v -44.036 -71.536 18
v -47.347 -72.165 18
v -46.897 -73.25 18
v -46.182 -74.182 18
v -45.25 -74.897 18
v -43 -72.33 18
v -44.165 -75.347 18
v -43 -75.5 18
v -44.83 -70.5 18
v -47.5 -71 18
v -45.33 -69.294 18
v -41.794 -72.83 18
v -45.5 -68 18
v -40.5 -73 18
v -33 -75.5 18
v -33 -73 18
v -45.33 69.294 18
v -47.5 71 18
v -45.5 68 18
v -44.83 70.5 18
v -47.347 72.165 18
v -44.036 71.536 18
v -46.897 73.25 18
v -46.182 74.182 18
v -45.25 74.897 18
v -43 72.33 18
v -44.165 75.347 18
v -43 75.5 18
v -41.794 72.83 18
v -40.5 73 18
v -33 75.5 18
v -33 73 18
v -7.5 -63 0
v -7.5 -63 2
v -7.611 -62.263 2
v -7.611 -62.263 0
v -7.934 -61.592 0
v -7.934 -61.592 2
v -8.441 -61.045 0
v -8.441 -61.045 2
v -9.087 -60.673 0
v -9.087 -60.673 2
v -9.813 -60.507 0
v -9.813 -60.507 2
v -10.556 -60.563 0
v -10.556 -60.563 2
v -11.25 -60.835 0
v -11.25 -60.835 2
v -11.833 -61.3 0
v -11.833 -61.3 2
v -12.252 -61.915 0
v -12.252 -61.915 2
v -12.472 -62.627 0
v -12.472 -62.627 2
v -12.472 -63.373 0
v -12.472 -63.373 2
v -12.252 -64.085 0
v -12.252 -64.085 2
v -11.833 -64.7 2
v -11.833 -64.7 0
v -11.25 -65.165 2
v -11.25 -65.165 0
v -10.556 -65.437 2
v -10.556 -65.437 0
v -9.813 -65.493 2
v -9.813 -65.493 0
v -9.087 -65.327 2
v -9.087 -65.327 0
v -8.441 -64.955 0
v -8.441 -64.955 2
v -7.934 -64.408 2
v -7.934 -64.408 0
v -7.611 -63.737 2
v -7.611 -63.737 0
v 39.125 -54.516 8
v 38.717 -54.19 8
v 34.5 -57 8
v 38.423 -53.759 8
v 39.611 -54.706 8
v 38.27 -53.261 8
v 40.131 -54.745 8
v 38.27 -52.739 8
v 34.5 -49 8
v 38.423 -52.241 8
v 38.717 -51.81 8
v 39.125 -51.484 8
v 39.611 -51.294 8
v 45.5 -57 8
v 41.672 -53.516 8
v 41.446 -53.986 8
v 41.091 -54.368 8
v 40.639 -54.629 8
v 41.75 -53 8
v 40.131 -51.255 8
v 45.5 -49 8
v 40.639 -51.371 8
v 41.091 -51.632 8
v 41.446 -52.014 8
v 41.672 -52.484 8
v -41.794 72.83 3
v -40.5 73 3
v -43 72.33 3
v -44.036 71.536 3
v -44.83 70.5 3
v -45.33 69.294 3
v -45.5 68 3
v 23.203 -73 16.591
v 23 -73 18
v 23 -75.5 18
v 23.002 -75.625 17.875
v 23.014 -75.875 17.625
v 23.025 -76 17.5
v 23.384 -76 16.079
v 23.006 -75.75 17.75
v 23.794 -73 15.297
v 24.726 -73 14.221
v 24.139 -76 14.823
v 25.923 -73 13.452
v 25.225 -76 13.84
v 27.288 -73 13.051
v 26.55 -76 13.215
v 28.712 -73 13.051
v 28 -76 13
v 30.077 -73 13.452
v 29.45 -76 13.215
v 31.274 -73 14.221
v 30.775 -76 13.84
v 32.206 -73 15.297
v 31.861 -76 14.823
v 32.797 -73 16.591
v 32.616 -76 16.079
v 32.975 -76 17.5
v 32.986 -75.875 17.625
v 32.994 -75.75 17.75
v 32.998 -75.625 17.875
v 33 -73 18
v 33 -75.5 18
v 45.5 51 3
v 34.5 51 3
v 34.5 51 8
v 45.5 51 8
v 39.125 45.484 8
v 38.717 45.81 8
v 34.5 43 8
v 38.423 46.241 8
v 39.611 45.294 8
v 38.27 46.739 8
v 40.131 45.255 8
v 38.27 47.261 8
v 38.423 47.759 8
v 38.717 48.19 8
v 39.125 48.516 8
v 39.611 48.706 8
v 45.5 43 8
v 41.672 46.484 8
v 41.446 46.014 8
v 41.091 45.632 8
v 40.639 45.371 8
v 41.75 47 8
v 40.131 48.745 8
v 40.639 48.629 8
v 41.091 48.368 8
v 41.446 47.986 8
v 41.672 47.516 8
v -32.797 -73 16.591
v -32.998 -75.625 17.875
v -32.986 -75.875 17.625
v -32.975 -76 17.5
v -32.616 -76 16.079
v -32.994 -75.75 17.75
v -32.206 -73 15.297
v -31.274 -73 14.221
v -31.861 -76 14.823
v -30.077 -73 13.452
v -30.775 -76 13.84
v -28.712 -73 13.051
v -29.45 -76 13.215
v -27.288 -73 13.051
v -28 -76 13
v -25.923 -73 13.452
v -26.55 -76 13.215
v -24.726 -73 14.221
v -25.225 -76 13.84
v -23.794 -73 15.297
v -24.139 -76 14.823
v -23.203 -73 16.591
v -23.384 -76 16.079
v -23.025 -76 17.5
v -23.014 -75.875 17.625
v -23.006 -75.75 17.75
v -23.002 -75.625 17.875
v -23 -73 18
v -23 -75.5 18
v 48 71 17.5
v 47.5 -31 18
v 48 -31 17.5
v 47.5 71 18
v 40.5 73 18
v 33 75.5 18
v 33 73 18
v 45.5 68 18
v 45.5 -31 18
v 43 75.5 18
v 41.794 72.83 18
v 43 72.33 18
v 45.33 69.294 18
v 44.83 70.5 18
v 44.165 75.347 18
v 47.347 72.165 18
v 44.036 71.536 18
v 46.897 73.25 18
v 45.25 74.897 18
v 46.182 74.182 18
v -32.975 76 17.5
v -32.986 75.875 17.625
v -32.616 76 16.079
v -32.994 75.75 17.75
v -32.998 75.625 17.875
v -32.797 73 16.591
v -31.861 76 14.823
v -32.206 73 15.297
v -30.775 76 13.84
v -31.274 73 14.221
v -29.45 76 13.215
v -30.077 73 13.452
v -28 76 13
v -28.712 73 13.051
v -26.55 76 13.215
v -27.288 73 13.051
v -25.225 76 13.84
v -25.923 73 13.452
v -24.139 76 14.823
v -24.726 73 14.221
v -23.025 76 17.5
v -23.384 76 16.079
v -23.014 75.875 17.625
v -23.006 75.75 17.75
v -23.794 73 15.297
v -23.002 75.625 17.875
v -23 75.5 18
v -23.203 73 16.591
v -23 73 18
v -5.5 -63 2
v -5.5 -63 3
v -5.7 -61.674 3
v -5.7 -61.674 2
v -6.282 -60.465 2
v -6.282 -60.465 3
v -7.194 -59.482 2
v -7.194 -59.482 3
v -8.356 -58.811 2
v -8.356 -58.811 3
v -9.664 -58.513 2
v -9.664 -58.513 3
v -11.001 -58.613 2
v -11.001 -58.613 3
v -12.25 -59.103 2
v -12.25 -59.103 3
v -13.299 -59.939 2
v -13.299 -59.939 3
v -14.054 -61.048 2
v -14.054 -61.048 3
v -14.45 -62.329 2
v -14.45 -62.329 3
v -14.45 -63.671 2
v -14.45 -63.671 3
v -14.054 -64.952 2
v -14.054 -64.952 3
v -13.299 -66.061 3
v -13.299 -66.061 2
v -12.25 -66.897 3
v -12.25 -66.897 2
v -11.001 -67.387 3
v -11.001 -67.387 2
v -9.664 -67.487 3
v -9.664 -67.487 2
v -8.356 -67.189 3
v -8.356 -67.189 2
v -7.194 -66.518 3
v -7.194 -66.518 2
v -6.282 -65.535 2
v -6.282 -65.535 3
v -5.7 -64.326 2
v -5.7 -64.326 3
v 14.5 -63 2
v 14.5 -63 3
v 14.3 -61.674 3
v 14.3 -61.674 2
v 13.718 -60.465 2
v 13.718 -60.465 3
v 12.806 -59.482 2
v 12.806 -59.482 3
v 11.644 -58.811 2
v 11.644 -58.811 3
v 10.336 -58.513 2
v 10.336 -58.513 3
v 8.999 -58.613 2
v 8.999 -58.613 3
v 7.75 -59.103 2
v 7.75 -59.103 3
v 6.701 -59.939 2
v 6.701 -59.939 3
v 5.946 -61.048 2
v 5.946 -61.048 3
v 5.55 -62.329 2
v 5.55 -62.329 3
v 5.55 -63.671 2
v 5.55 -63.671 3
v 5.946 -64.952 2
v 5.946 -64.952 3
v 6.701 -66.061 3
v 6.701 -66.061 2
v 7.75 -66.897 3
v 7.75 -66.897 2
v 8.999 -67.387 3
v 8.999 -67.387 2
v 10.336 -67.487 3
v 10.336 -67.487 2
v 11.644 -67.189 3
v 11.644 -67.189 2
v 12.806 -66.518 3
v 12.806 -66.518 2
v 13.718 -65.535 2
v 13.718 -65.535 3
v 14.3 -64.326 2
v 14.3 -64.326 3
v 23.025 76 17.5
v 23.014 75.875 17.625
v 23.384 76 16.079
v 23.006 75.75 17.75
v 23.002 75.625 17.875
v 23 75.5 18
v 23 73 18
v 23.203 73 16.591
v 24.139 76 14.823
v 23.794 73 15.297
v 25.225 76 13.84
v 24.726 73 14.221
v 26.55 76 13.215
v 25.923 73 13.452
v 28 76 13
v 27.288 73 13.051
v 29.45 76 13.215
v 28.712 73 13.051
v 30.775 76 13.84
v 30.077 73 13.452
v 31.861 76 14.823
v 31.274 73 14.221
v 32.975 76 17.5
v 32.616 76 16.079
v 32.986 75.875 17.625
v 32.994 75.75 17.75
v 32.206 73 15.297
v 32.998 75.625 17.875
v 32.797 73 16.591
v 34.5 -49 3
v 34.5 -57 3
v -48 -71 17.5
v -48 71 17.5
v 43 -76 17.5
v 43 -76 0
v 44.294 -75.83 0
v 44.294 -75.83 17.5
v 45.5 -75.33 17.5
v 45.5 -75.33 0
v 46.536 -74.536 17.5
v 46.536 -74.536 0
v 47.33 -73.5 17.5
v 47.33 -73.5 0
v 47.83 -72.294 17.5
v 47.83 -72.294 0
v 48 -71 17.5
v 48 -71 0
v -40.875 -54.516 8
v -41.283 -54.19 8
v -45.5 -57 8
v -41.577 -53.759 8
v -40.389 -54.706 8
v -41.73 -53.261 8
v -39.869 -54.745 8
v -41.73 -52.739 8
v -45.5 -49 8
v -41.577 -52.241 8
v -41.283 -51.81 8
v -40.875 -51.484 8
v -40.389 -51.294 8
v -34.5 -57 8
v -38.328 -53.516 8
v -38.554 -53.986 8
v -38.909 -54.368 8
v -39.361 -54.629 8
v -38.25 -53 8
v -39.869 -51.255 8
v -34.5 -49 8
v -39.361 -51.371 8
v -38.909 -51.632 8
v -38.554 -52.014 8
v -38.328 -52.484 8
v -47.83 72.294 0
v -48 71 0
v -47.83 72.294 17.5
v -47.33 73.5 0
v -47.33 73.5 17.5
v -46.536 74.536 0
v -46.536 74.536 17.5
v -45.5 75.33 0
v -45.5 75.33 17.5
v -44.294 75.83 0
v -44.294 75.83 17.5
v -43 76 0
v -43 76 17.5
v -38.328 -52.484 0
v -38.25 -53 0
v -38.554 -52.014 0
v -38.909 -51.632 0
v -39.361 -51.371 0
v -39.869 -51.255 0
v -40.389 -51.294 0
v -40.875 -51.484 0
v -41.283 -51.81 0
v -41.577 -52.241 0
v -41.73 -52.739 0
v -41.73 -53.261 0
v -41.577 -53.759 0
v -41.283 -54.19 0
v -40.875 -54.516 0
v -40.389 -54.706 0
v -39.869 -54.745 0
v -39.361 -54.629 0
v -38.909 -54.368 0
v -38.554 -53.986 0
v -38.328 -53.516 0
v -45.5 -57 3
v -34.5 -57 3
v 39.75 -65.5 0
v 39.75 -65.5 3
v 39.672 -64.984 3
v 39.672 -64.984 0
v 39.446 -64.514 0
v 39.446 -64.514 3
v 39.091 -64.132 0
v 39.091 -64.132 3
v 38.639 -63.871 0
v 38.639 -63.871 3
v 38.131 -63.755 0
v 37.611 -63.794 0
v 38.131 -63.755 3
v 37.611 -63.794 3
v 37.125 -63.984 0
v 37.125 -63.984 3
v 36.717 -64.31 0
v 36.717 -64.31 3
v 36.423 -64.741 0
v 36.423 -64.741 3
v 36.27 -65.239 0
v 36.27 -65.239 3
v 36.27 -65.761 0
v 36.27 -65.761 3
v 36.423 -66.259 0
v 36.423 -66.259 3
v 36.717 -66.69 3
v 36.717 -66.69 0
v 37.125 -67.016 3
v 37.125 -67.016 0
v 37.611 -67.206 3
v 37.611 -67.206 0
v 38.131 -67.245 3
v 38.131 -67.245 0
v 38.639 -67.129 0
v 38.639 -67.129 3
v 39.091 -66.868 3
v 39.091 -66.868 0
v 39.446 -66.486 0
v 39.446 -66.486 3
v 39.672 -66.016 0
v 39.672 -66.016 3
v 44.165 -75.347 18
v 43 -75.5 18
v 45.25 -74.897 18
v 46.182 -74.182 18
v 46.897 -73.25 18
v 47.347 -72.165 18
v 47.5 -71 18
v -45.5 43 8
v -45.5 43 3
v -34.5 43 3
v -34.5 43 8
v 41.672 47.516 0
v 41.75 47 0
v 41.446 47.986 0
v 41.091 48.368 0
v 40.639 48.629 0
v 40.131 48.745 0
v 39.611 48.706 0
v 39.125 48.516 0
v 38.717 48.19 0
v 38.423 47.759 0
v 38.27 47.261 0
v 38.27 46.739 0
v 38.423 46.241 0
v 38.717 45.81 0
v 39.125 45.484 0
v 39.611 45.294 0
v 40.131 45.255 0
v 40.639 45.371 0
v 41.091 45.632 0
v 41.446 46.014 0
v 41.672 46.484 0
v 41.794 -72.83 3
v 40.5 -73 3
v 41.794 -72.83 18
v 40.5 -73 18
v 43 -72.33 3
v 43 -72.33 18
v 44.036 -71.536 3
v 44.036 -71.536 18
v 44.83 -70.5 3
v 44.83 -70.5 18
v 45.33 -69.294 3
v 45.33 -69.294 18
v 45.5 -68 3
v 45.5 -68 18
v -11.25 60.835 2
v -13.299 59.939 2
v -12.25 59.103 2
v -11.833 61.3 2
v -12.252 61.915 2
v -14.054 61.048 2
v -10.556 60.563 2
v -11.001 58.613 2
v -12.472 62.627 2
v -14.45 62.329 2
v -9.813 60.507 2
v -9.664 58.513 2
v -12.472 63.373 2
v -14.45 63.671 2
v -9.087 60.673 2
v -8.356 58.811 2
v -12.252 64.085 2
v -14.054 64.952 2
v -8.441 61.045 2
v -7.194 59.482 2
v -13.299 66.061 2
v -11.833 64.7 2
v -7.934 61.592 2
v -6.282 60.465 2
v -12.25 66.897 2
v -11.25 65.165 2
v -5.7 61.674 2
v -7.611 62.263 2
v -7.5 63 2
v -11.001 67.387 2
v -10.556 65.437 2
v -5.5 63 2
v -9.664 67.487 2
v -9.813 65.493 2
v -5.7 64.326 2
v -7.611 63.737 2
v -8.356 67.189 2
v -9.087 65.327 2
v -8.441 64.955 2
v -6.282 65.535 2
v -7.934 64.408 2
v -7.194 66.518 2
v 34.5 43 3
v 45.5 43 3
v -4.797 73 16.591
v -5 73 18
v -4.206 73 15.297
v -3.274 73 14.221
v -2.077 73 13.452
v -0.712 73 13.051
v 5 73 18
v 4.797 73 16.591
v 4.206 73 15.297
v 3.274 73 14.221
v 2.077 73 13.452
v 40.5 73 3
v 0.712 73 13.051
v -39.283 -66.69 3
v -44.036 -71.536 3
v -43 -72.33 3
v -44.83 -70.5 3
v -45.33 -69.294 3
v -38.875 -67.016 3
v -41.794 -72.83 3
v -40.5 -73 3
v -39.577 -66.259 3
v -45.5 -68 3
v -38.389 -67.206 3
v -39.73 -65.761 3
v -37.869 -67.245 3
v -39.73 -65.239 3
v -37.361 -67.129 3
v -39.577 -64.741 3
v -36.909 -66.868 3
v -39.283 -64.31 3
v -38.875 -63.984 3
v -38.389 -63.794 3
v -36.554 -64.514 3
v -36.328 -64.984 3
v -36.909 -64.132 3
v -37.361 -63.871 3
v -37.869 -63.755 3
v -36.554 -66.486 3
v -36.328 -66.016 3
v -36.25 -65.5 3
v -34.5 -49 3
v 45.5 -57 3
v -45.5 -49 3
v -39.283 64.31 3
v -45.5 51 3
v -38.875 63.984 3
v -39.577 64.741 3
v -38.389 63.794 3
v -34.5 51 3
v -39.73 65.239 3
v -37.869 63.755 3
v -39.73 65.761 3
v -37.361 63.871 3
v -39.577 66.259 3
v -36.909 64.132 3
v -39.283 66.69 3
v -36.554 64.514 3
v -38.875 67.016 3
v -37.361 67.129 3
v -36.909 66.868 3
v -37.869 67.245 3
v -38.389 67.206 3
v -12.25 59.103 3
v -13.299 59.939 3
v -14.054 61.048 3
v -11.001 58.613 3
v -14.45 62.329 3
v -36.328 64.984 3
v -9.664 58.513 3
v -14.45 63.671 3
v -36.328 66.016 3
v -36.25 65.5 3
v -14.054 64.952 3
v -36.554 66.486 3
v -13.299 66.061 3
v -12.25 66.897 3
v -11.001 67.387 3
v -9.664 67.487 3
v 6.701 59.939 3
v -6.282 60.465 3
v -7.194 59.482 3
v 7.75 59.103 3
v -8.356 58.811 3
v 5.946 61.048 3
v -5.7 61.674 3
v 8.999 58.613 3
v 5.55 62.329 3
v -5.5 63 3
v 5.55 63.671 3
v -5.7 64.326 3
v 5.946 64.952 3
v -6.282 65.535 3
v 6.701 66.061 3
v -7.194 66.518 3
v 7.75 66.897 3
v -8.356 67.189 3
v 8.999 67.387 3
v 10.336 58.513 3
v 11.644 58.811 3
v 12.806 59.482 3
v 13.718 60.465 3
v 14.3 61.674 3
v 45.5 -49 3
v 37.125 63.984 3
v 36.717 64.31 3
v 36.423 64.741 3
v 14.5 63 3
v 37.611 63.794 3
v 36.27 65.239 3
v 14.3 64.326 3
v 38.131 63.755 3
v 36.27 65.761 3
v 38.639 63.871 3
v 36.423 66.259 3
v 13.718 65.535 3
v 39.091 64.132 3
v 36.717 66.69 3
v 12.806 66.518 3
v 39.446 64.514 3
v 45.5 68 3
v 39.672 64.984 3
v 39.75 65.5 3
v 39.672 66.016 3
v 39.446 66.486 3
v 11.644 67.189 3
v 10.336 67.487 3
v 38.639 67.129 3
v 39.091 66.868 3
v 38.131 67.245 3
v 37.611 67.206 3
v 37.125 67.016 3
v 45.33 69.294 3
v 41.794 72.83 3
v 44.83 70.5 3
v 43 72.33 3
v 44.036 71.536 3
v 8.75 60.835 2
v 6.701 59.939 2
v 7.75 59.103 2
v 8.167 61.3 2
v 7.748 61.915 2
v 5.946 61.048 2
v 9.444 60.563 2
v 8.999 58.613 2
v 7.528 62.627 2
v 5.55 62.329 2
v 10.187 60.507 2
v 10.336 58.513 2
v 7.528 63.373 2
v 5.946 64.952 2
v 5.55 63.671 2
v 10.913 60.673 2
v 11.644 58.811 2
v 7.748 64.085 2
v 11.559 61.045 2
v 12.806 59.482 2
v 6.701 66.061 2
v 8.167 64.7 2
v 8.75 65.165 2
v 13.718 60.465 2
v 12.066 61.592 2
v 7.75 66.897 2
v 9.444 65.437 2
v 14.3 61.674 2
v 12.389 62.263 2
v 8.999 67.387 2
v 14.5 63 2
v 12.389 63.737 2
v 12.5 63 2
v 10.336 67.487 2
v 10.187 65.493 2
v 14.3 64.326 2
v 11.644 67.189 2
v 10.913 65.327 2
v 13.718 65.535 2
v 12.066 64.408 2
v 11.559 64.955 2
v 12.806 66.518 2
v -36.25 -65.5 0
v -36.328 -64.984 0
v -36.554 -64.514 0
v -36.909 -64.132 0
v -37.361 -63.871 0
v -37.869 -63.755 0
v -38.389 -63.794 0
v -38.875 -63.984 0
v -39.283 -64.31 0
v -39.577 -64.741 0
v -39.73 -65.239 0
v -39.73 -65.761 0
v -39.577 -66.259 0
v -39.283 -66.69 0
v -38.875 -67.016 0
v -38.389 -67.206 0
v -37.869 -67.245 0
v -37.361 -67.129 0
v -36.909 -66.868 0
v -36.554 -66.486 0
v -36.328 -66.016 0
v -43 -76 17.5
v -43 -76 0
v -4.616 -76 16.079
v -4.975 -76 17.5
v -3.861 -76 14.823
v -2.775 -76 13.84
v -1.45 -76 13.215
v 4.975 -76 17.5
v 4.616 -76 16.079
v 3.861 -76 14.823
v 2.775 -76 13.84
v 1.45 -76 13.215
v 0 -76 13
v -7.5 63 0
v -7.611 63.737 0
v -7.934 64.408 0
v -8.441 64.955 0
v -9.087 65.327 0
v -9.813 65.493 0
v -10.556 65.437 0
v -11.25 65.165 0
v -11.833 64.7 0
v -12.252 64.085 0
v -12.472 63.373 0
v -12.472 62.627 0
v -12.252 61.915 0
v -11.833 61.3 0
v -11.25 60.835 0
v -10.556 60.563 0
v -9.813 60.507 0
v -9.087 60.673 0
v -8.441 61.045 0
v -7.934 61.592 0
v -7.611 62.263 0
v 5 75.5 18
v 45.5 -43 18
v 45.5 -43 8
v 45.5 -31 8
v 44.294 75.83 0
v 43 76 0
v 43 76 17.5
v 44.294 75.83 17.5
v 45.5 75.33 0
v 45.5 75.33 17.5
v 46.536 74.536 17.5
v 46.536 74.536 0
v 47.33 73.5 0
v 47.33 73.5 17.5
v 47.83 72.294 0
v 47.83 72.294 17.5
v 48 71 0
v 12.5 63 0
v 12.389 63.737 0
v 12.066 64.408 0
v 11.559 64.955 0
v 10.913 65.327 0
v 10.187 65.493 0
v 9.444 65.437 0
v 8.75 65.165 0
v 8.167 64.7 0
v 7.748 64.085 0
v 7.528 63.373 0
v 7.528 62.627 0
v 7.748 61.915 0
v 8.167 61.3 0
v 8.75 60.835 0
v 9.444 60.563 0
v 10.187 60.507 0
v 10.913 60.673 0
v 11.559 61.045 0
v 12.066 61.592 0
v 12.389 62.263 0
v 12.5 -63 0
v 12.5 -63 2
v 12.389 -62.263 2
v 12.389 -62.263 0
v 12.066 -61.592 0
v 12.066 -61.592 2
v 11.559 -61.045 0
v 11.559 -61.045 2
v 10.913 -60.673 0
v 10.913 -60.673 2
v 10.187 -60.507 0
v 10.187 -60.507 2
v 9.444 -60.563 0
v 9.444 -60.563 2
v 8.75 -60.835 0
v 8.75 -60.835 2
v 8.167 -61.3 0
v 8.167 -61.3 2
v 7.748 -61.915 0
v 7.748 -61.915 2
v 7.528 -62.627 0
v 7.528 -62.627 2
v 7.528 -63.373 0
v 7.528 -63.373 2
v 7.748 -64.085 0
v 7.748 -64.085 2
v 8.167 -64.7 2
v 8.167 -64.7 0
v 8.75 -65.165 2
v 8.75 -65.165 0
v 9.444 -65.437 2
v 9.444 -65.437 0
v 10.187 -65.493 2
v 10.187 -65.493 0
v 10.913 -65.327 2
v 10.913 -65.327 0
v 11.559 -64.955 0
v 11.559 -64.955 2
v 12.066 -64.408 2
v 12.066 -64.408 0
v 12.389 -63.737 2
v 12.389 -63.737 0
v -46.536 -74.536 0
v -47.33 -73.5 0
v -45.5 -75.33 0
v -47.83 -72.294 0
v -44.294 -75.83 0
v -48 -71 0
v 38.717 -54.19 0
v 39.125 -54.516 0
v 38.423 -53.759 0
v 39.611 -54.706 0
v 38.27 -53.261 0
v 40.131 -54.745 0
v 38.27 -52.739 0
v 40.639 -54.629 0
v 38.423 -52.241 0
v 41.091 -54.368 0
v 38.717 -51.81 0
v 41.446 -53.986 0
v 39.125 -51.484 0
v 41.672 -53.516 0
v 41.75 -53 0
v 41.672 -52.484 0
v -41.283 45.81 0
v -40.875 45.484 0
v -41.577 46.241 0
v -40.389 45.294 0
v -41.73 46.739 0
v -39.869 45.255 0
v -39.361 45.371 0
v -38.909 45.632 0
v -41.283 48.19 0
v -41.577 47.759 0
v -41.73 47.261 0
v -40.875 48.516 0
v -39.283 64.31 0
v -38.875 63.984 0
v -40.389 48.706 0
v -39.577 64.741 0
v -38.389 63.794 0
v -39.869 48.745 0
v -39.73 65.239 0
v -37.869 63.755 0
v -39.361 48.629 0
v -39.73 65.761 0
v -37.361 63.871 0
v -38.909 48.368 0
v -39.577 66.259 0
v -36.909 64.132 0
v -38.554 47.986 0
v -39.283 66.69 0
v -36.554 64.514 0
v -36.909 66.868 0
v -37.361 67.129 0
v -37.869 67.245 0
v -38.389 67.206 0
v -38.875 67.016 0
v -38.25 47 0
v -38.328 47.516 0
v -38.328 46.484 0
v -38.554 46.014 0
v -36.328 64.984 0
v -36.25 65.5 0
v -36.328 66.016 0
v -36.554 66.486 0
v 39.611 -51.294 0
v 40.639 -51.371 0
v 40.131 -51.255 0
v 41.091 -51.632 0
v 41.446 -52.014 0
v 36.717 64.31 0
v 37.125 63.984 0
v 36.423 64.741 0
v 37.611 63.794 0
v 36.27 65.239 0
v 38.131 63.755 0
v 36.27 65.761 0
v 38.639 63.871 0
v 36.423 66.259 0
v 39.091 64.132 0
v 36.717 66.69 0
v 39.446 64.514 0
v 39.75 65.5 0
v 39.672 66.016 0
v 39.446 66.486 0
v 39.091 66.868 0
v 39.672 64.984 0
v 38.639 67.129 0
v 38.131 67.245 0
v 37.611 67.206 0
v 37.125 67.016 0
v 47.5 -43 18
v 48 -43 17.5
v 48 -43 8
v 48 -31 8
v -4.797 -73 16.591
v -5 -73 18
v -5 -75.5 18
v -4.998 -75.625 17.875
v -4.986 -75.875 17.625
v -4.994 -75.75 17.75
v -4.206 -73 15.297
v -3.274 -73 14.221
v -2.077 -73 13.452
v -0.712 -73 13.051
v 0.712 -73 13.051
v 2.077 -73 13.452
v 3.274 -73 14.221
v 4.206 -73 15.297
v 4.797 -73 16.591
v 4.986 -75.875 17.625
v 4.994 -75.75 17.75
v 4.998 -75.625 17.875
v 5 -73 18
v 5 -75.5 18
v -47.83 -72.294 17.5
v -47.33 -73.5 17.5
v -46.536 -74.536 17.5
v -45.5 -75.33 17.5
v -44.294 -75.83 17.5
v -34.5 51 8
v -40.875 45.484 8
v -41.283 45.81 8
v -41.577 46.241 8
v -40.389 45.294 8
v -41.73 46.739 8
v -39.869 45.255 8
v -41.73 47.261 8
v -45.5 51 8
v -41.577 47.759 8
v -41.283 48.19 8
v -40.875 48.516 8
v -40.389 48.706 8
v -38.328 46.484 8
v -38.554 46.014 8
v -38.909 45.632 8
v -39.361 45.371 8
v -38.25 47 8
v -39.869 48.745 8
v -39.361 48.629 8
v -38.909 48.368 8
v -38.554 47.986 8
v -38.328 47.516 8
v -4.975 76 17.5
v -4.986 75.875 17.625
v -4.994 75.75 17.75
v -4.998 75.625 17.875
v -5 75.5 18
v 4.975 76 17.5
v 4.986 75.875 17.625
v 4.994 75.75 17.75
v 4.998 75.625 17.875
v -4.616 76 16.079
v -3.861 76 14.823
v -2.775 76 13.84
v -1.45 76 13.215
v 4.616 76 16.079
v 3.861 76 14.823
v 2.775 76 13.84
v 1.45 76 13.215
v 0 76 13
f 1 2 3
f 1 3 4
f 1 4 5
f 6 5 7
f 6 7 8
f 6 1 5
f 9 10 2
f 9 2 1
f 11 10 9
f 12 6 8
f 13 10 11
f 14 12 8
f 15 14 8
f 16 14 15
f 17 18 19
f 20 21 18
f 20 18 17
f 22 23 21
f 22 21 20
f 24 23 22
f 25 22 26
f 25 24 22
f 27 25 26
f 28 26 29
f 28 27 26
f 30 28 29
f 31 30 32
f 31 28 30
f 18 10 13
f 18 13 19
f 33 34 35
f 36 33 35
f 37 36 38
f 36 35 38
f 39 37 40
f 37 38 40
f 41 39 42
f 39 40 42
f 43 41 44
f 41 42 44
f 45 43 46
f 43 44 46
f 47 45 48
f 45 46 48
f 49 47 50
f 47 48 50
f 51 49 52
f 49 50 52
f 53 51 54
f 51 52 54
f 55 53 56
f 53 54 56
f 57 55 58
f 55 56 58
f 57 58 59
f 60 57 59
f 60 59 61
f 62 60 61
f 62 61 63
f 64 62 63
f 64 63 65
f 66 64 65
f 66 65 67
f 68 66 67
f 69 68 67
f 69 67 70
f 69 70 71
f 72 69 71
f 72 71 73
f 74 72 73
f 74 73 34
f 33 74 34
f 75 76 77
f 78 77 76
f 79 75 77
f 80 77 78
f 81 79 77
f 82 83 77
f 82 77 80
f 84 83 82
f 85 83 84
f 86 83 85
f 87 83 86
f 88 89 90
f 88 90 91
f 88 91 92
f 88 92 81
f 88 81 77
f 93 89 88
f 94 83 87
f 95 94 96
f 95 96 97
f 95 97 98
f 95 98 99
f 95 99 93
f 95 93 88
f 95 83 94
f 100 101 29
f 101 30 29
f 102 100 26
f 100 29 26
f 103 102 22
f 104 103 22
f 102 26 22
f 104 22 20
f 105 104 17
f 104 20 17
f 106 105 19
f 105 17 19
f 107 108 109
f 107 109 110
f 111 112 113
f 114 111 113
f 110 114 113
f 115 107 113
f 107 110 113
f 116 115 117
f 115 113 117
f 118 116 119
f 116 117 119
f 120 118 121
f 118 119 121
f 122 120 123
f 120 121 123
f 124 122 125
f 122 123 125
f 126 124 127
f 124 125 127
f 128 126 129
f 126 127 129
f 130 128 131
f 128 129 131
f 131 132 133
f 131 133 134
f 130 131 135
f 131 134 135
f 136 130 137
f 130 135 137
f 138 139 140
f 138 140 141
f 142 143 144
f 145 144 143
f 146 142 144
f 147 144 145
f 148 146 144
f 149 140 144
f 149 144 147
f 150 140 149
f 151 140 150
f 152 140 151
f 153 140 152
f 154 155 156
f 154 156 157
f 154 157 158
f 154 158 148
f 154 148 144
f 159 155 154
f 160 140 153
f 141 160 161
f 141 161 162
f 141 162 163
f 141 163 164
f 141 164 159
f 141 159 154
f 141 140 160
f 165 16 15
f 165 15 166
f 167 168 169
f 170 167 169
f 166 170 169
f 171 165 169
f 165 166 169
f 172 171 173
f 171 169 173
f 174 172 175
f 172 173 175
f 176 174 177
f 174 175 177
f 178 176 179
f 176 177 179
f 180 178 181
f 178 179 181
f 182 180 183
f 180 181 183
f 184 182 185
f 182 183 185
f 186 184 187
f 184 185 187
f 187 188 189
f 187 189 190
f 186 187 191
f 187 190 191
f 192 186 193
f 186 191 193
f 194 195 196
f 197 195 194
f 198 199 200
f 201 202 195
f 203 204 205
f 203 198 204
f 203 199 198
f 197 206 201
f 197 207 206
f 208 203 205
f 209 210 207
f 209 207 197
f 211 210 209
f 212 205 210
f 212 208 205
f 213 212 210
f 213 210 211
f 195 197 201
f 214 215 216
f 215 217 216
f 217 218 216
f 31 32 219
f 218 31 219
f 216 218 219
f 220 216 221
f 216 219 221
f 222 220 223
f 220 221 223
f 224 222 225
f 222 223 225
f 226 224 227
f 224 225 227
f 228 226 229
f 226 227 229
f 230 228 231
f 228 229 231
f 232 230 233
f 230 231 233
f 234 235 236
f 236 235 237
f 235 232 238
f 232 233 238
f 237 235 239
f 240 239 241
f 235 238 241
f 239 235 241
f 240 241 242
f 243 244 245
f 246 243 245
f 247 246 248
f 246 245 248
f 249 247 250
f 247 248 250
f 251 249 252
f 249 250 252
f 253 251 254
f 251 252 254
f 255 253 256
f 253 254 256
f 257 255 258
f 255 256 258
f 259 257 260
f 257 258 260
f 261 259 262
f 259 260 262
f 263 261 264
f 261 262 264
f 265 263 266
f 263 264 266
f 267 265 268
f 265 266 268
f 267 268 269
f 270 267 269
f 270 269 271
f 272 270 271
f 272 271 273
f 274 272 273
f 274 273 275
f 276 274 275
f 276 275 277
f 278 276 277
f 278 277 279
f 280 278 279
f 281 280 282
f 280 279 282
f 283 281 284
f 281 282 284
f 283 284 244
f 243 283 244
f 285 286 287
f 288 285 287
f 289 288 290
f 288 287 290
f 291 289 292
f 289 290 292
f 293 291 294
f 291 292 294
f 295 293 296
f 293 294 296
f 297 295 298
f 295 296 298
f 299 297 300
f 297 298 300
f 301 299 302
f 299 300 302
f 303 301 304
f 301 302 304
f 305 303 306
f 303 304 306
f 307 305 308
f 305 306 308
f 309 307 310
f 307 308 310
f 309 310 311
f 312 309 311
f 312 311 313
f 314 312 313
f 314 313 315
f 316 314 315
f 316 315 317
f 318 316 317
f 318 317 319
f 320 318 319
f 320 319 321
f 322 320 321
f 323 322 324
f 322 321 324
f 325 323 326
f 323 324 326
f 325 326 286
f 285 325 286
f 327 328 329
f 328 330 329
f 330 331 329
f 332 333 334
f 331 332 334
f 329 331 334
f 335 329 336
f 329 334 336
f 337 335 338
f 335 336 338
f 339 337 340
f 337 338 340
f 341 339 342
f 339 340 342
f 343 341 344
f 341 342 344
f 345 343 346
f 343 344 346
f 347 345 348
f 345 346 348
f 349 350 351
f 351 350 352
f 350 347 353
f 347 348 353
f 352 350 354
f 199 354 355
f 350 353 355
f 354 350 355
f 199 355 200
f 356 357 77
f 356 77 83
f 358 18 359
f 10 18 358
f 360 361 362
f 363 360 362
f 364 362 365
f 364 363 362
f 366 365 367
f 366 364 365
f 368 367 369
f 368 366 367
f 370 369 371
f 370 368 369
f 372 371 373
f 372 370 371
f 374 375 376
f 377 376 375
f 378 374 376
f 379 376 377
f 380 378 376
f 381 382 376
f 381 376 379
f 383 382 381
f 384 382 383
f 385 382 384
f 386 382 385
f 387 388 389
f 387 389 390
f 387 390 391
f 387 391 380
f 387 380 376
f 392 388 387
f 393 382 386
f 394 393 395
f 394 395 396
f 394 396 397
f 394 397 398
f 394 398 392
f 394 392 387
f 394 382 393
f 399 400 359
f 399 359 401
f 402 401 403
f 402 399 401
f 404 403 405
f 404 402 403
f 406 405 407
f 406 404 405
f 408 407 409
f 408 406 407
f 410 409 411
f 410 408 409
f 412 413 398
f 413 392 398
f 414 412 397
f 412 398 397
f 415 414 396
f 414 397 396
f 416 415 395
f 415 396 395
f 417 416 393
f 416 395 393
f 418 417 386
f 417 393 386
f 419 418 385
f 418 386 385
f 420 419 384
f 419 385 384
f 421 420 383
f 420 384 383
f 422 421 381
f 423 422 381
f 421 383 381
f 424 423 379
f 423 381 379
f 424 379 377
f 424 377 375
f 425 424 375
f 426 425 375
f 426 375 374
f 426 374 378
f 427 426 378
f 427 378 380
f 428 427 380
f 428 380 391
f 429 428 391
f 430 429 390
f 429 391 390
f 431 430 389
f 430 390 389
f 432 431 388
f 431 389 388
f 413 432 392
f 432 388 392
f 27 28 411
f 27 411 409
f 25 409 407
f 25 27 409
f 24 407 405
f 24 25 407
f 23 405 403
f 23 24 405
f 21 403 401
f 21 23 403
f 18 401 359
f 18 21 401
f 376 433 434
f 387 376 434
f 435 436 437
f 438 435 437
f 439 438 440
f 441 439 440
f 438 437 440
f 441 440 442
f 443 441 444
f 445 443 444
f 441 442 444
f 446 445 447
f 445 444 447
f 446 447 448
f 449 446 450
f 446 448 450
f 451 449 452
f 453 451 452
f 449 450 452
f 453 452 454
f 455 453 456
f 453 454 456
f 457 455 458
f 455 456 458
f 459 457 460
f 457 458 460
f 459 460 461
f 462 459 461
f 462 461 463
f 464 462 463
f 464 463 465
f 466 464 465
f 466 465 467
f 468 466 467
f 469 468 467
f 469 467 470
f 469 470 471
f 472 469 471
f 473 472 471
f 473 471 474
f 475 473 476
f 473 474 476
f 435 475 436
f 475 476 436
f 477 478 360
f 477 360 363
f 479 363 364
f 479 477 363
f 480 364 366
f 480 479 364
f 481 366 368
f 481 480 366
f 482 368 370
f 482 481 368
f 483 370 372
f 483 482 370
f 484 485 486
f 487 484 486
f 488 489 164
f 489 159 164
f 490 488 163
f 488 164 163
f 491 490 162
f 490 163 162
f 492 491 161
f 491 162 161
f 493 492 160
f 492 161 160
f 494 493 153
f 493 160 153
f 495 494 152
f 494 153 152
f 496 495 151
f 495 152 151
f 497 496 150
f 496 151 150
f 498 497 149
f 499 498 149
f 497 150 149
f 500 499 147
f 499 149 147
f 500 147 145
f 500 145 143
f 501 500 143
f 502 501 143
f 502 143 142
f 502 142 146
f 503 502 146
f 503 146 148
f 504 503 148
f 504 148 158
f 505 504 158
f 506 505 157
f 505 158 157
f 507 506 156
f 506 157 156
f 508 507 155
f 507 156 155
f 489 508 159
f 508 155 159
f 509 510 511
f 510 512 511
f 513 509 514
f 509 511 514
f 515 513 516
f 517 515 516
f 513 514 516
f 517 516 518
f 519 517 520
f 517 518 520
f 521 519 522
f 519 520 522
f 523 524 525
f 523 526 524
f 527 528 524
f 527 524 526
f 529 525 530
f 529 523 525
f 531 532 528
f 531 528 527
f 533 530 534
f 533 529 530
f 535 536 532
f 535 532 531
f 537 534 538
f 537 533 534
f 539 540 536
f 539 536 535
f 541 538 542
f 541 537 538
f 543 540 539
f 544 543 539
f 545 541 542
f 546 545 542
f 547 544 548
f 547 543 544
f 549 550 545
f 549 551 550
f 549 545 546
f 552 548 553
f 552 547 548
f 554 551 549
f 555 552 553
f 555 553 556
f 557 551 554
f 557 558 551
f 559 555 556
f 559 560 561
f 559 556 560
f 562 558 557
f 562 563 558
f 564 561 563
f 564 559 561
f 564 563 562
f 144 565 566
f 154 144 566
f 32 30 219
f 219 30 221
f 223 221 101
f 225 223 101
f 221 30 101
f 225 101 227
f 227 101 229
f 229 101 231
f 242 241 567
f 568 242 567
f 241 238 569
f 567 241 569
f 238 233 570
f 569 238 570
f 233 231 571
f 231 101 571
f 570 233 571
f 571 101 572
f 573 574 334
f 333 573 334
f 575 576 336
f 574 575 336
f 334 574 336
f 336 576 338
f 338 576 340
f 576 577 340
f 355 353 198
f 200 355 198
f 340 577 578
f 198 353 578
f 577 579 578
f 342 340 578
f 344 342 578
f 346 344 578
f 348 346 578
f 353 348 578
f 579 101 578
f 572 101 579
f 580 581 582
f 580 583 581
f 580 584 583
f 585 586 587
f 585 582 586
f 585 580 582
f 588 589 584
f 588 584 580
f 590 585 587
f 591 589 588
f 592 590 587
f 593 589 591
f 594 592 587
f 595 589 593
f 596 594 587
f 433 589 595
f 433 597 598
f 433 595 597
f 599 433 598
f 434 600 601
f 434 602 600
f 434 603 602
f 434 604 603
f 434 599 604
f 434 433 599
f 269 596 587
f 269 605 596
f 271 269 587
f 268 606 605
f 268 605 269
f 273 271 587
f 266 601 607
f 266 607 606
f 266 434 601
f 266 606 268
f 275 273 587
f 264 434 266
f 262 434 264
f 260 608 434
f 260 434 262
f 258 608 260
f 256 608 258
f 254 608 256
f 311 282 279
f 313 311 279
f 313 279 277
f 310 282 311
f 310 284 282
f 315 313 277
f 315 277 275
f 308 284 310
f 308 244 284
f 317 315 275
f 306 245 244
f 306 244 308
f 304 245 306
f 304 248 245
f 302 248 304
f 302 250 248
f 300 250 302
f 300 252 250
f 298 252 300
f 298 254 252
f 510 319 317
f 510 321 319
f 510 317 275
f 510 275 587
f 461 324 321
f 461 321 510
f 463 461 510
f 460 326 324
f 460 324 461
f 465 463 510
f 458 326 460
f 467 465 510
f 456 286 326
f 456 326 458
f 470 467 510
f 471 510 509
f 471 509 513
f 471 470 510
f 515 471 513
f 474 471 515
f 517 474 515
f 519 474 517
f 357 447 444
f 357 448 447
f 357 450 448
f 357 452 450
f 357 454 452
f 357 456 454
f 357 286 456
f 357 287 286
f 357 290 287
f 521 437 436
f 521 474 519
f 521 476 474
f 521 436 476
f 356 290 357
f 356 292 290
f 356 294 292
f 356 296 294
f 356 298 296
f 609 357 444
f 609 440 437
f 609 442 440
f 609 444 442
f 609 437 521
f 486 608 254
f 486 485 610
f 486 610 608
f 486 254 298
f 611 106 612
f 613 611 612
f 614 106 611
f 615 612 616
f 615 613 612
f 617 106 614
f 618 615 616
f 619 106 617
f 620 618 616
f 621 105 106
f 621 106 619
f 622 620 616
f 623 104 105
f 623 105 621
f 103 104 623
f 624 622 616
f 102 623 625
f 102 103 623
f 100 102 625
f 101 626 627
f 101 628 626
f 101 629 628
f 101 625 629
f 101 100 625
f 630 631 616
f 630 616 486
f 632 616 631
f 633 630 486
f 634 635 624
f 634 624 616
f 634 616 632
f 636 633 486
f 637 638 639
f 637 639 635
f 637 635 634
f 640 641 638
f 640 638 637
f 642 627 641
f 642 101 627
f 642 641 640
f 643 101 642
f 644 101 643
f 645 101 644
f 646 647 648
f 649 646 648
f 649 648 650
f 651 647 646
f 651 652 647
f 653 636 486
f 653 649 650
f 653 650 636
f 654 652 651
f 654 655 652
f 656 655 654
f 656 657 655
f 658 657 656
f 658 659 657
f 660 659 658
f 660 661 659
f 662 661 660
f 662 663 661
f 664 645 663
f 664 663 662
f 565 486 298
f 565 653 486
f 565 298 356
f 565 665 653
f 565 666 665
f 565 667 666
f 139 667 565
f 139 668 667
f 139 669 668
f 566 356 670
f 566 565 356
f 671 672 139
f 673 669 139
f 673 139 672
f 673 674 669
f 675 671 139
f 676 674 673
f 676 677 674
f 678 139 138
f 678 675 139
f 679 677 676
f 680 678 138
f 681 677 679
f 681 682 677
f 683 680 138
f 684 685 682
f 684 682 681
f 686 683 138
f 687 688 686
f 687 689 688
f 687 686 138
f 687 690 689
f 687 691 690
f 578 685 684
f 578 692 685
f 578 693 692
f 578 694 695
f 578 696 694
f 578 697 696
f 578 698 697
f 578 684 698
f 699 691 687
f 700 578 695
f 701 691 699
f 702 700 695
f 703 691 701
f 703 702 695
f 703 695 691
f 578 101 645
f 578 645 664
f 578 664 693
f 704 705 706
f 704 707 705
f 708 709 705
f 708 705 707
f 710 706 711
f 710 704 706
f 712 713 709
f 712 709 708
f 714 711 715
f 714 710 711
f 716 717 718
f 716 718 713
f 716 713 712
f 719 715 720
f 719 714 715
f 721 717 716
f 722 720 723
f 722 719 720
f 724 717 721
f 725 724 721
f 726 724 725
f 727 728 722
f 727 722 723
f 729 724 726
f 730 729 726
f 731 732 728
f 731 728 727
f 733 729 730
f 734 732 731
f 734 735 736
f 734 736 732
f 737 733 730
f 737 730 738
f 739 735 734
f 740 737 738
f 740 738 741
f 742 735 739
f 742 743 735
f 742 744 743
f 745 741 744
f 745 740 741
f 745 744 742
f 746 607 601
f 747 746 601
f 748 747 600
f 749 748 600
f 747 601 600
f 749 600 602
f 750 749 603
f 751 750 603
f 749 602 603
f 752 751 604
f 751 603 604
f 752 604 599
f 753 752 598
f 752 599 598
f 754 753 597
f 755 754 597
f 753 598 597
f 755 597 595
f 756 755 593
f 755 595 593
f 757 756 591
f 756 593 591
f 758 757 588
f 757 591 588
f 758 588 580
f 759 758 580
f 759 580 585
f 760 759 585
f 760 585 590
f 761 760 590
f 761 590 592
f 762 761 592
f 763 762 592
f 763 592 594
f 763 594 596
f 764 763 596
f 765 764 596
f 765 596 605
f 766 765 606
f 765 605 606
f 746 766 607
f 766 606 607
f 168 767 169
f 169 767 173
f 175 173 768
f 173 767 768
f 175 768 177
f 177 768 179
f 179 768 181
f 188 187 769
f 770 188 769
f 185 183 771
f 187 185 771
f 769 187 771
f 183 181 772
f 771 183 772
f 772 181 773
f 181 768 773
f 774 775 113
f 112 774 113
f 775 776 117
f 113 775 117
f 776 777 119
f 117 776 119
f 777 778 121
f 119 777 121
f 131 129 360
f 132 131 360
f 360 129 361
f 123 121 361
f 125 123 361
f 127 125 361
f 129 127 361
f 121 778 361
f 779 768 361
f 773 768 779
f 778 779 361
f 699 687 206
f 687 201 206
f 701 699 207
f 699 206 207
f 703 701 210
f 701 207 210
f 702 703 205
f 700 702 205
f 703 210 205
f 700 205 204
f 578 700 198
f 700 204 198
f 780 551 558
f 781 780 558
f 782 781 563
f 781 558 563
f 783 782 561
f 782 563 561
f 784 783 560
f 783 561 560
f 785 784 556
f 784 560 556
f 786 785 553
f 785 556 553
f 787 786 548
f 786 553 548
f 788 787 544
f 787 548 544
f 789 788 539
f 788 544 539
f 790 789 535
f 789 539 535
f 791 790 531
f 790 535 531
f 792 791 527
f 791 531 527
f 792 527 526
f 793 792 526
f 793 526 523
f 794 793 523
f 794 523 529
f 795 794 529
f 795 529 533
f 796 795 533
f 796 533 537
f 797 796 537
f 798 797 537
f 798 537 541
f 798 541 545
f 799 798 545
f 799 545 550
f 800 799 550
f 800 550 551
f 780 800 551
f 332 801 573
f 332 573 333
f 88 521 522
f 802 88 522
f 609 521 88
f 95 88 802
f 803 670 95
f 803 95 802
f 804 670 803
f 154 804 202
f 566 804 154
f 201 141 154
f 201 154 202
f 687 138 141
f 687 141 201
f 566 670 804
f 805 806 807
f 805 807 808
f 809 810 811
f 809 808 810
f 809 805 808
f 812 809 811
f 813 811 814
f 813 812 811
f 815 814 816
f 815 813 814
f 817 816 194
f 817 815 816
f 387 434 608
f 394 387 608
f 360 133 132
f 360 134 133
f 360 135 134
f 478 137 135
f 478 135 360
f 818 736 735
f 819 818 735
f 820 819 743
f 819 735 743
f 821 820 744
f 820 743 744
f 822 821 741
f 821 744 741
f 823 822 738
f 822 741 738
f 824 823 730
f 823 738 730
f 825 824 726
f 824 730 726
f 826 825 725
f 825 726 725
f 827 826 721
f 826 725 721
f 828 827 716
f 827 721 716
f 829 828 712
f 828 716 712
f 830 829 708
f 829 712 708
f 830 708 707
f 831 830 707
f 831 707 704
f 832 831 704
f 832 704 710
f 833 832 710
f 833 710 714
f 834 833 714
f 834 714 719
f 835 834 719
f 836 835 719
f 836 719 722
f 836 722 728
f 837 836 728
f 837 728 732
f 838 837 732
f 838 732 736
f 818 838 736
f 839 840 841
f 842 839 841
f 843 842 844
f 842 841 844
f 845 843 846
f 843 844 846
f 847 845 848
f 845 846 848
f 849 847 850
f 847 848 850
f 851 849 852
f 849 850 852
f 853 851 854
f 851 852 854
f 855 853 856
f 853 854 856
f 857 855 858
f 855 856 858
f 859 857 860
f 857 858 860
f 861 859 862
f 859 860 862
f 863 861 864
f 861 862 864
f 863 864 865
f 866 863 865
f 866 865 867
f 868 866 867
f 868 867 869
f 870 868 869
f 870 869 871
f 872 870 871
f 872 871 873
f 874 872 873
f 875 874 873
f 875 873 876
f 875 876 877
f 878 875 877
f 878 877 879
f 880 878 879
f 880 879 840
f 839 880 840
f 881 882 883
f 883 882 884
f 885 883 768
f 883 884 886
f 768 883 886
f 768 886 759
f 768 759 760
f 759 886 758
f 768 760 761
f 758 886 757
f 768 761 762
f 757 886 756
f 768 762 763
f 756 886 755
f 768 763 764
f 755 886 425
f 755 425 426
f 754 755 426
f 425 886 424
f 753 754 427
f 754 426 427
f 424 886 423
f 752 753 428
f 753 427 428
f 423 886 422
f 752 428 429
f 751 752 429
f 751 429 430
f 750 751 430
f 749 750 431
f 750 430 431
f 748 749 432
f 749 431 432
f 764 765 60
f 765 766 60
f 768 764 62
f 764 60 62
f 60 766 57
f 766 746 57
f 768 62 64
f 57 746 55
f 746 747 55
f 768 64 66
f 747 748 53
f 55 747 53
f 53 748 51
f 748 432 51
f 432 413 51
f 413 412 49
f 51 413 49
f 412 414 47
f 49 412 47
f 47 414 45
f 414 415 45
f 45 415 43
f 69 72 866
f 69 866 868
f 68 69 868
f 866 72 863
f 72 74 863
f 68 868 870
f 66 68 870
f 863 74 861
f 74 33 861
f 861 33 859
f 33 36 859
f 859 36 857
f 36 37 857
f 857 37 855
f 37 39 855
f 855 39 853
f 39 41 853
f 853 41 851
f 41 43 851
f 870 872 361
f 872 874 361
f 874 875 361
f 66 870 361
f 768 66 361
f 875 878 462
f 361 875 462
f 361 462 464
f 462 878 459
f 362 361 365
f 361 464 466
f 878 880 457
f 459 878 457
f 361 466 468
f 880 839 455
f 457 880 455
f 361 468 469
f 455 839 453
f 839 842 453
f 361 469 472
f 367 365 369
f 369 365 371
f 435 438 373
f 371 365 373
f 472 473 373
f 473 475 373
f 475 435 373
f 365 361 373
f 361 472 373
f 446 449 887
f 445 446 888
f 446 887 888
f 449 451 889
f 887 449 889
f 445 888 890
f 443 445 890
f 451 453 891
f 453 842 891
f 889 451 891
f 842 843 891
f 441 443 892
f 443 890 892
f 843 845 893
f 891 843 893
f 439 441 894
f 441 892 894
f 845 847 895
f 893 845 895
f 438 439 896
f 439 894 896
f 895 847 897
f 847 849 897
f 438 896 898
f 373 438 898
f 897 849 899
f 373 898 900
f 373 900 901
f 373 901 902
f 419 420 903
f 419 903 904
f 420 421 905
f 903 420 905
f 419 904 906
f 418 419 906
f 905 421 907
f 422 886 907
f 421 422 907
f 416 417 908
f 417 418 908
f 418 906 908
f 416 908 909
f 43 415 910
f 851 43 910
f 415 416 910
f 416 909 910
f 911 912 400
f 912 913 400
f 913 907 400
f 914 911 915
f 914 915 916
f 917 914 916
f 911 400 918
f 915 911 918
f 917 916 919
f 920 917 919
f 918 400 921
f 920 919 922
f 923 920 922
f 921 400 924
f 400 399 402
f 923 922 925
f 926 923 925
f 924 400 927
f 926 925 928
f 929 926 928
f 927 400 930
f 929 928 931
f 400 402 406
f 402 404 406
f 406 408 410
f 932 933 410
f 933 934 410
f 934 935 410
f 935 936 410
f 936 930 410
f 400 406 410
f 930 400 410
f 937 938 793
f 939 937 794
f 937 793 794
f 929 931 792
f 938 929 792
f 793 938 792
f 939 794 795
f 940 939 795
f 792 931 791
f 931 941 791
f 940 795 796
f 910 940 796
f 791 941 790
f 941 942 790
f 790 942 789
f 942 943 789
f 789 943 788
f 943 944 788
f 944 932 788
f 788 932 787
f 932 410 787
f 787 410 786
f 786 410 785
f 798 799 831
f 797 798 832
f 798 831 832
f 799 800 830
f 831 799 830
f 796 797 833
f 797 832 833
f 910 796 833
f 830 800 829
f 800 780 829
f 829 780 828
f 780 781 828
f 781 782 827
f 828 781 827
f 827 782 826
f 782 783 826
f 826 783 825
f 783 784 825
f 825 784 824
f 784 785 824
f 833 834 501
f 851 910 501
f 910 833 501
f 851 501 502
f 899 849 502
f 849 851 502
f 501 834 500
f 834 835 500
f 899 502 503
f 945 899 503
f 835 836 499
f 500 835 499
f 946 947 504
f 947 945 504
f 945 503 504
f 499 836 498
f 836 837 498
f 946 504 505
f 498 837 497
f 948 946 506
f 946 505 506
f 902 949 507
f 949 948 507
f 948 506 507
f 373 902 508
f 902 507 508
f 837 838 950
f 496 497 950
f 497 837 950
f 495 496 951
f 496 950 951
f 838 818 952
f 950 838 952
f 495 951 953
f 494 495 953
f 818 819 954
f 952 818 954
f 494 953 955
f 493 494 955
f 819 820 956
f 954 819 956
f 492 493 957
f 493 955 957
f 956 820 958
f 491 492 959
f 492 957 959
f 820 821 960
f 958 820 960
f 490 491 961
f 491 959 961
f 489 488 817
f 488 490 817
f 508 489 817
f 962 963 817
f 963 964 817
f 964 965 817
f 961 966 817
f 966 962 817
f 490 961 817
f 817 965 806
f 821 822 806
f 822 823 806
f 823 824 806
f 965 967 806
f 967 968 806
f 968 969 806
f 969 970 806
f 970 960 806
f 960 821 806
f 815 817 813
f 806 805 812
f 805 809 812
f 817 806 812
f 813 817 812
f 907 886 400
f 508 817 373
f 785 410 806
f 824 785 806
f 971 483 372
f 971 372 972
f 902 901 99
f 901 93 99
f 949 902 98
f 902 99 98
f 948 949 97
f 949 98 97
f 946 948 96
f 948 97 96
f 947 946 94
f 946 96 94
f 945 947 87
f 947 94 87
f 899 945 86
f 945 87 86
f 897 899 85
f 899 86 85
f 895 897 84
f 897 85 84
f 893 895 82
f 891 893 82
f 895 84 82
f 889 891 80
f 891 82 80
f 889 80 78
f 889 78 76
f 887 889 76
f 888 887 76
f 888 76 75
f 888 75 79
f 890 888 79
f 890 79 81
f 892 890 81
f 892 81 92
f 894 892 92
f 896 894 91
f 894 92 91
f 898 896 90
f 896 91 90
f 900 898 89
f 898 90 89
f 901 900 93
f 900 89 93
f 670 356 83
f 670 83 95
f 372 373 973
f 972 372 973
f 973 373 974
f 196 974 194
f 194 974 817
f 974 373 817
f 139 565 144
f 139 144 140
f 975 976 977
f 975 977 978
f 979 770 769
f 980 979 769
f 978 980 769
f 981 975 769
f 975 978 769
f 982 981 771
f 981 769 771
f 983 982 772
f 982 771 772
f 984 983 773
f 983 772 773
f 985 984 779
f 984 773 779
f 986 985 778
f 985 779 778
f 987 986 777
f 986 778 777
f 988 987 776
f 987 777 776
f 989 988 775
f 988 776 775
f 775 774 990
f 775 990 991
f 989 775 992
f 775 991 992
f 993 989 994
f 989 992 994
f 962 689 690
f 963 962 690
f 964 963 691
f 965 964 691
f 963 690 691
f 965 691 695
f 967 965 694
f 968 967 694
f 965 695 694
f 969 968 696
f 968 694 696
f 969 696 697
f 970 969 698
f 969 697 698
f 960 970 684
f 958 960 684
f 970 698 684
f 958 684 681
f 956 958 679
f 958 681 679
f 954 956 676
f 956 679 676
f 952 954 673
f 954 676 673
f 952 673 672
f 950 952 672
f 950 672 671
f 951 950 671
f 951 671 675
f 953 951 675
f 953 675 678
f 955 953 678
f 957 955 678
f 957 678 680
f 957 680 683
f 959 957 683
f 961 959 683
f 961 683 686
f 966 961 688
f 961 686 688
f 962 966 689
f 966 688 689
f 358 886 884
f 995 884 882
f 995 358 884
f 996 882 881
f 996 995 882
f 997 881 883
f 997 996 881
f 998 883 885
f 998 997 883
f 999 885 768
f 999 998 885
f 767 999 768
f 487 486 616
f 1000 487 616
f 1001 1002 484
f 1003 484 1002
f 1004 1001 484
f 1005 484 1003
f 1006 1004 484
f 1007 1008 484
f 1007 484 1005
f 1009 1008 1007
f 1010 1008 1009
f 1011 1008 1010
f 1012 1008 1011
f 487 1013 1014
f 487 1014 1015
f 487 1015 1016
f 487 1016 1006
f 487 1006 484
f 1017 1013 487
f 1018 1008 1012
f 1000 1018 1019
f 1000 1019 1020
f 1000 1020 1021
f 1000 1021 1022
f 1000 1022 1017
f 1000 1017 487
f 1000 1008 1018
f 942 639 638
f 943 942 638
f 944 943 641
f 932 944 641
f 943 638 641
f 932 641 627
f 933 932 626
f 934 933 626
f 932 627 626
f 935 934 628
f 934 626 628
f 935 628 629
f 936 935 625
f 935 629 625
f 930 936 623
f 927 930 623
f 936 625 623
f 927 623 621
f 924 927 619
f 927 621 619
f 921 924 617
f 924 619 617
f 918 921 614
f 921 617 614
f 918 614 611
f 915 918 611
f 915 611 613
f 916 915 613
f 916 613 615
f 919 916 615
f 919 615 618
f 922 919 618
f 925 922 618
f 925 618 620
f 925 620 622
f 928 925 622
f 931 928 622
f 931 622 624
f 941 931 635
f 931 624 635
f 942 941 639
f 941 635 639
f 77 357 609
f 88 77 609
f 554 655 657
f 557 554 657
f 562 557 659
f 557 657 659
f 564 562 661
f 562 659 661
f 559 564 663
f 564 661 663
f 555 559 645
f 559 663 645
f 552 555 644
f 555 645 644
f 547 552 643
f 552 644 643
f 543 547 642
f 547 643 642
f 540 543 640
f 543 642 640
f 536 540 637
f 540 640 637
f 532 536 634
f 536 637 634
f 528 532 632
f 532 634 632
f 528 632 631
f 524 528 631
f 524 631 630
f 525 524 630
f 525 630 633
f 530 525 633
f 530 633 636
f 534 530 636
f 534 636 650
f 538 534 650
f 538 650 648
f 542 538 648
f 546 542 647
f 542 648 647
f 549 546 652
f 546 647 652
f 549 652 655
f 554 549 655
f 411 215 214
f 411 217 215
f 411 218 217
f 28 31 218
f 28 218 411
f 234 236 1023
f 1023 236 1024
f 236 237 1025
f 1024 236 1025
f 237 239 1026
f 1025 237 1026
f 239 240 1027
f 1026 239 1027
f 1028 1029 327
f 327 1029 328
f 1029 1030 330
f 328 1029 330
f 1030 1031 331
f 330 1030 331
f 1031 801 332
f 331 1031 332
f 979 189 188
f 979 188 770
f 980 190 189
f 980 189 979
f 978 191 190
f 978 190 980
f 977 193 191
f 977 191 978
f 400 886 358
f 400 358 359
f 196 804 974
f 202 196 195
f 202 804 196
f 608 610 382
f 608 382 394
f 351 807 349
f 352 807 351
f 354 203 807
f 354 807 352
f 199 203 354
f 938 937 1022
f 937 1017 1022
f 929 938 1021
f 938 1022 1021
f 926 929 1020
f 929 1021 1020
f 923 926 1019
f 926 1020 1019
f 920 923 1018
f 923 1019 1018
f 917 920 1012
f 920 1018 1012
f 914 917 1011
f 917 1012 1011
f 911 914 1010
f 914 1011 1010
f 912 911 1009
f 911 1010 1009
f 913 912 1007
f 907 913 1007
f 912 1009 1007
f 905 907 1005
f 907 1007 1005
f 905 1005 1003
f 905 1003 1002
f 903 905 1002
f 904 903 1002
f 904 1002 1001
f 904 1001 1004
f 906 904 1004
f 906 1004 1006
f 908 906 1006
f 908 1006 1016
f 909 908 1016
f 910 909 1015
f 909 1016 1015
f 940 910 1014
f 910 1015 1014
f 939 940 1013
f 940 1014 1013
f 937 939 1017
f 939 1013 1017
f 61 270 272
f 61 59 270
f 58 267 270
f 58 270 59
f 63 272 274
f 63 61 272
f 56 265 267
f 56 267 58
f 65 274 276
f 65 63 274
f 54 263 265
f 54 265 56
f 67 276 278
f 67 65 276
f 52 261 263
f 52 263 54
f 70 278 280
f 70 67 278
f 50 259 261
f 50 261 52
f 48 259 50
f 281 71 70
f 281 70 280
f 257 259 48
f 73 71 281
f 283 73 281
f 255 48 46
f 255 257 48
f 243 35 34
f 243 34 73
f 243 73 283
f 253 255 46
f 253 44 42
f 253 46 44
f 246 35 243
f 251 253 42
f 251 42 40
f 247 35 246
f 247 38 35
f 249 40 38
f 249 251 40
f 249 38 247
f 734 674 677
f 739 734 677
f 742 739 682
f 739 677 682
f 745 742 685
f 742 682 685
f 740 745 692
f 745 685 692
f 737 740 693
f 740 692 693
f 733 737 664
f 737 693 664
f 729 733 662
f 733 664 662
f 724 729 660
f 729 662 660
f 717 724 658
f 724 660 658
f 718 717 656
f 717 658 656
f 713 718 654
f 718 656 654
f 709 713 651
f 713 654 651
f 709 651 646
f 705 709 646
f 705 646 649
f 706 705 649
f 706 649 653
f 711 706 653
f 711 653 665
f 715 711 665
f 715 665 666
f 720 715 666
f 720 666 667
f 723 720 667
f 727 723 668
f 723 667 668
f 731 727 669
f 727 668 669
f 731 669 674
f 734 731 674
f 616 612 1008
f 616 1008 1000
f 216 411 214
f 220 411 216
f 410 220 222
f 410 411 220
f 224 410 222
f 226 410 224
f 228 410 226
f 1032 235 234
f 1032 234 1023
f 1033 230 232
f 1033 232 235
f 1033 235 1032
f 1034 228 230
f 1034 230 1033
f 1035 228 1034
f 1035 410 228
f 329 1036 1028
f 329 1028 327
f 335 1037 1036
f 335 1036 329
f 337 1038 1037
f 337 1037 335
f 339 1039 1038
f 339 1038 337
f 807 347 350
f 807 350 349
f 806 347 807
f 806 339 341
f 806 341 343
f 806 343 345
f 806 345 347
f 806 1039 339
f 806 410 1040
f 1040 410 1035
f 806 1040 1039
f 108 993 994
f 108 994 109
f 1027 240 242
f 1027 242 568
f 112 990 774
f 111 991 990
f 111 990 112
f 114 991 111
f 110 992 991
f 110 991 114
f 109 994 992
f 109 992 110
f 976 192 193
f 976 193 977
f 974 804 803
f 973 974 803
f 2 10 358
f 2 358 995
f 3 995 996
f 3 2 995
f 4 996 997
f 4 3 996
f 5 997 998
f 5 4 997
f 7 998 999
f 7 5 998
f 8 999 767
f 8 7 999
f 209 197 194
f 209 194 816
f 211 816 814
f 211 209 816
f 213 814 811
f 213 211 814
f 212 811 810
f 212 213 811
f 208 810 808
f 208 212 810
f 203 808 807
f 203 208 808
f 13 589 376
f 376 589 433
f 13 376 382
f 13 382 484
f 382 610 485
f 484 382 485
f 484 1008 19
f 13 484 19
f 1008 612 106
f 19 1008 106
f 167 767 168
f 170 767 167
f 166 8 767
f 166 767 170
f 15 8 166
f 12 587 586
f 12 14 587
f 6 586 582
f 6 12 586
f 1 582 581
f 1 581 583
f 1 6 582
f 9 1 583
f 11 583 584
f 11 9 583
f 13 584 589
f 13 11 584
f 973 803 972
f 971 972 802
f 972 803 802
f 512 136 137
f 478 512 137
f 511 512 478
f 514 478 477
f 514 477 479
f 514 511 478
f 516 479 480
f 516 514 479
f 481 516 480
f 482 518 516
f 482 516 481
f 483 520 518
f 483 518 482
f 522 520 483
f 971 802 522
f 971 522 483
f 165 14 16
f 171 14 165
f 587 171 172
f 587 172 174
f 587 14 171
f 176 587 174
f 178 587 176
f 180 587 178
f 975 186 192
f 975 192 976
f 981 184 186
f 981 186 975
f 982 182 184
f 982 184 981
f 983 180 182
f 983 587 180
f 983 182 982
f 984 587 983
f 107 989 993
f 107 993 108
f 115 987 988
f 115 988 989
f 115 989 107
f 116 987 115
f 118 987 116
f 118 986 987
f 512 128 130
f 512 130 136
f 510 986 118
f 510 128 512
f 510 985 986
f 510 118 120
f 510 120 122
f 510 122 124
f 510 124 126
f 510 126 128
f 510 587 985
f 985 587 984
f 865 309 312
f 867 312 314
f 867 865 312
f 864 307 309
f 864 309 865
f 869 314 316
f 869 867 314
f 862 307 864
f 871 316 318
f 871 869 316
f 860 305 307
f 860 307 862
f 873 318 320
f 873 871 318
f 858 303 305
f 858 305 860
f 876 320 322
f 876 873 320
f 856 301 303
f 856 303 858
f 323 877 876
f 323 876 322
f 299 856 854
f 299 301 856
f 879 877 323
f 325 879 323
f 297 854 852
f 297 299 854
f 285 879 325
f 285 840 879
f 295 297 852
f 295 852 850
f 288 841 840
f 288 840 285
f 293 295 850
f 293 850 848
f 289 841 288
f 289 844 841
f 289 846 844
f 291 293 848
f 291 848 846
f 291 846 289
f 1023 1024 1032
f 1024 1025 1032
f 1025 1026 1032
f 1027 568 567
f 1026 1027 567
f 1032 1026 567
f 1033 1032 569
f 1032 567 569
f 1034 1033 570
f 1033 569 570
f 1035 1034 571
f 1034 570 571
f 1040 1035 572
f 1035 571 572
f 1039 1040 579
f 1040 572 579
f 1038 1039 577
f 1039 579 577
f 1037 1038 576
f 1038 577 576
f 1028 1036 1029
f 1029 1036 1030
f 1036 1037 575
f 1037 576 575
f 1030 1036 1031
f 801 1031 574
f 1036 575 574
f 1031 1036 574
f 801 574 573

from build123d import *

# Parameters (mm, degrees)
F0_W      = 96
F0_H      = 152
F1_DEPTH  = 3
F2_W      = 96
F2_H      = 152
F2_W_2    = 91
F2_H_2    = 146
F3_DEPTH  = 15
F4_R      = 1.75
F5_DEPTH  = 3
F6_R      = 5
F7_R      = 5
F8_DEPTH  = 152.001
F9_W      = 11
F9_H      = 8
F10_DEPTH = 5
F11_R     = 1.75
F12_DEPTH = 15.001
F13_DEPTH = 25
F14_R     = 2.5
F15_DEPTH = 3.001
F16_W     = 12
F16_H     = 20.9038736373
F17_DEPTH = 2.501
F18_SIZE  = 0.5
F19_R     = 4.5
F20_DEPTH = 1


with BuildPart() as f1:
    # F0 (on Top) → F1 (new body)
    with BuildSketch(Plane.XY):
        Rectangle(F0_W, F0_H)
    extrude(amount=F1_DEPTH)

    # F2 (on face) → F3 (join)
    with BuildSketch(Plane.XY.offset(3)):
        Rectangle(F2_W, F2_H)
        Rectangle(F2_W_2, F2_H_2, mode=Mode.SUBTRACT)
    extrude(amount=F3_DEPTH)

    # F4 (on face) → F5 (cut, through all)
    with BuildSketch(Plane.XY.offset(3)):
        with Locations((-38, 65.5)):
            Circle(F4_R)
        with Locations((38, 65.5)):
            Circle(F4_R)
        with Locations((-38, -65.5)):
            Circle(F4_R)
        with Locations((38, -65.5)):
            Circle(F4_R)
    extrude(amount=-F5_DEPTH, mode=Mode.SUBTRACT)

    # F6
    f6_edges = [f1.edges().sort_by_distance(p)[0] for p in [
        (-48, -76, 9),
        (48, -76, 9),
        (45.5, -73, 10.5),
        (-45.5, -73, 10.5),
        (-48, 76, 9),
        (-45.5, 73, 10.5),
        (48, 76, 9),
        (45.5, 73, 10.5),
    ]]
    fillet(f6_edges, radius=F6_R)

    # F7 (on face) → F8 (cut, through all)
    with BuildSketch(Plane.XZ.offset(76)):
        with Locations((-28, 18)):
            Circle(F7_R)
        with Locations((0, 18)):
            Circle(F7_R)
        with Locations((28, 18)):
            Circle(F7_R)
    extrude(amount=-F8_DEPTH, mode=Mode.SUBTRACT)

    # F9 (on face) → F10 (join)
    with BuildSketch(Plane.XY.offset(3)):
        with Locations((-40, -53)):
            Rectangle(F9_W, F9_H)
        with Locations((40, -53)):
            Rectangle(F9_W, F9_H)
        with Locations((-40, 47)):
            Rectangle(F9_W, F9_H)
        with Locations((40, 47)):
            Rectangle(F9_W, F9_H)
    extrude(amount=F10_DEPTH)

    # F11 (on face) → F12 (cut, through all)
    with BuildSketch(Plane.XY.offset(3)):
        with Locations((-40, -53)):
            Circle(F11_R)
        with Locations((40, -53)):
            Circle(F11_R)
        with Locations((-40, 47)):
            Circle(F11_R)
        with Locations((40, 47)):
            Circle(F11_R)
    extrude(amount=F12_DEPTH, mode=Mode.SUBTRACT)

    # F11 (on face) → F13 (cut)
    with BuildSketch(Plane.XY.offset(3)):
        with Locations((-40, -53)):
            Circle(F11_R)
        with Locations((40, -53)):
            Circle(F11_R)
        with Locations((-40, 47)):
            Circle(F11_R)
        with Locations((40, 47)):
            Circle(F11_R)
    extrude(amount=-F13_DEPTH, mode=Mode.SUBTRACT)

    # F14 (on face) → F15 (cut, through all)
    with BuildSketch(Plane.XY.offset(3)):
        with Locations((-10, -63)):
            Circle(F14_R)
        with Locations((10, -63)):
            Circle(F14_R)
        with Locations((-10, 63)):
            Circle(F14_R)
        with Locations((10, 63)):
            Circle(F14_R)
    extrude(amount=-F15_DEPTH, mode=Mode.SUBTRACT)

    # F16 (on face) → F17 (cut, through all)
    with BuildSketch(Plane(origin=(45.5, 0, 0), x_dir=(0, -1, 0), z_dir=(-1, 0, 0))):
        with Locations((37, 18.4519368187)):
            Rectangle(F16_W, F16_H)
    extrude(amount=-F17_DEPTH, mode=Mode.SUBTRACT)

    # F18 (call 1 of 7: OpenCascade refuses the feature's edges together)
    f18_edges = [f1.edges().sort_by_distance(p)[0] for p in [
        (48, 20, 18),
    ]]
    chamfer(f18_edges, length=F18_SIZE)

    # F18#2 (call 2 of 7)
    f18_2_edges = [f1.edges().sort_by_distance(p)[0] for p in [
        (48, -57, 18),
        (46.535534, -74.535534, 18),
    ]]
    chamfer(f18_2_edges, length=F18_SIZE)

    # F18#3 (call 3 of 7)
    f18_3_edges = [f1.edges().sort_by_distance(p)[0] for p in [
        (14, -76, 18),
    ]]
    chamfer(f18_3_edges, length=F18_SIZE)

    # F18#4 (call 4 of 7)
    f18_4_edges = [f1.edges().sort_by_distance(p)[0] for p in [
        (-14, -76, 18),
    ]]
    chamfer(f18_4_edges, length=F18_SIZE)

    # F18#5 (call 5 of 7)
    f18_5_edges = [f1.edges().sort_by_distance(p)[0] for p in [
        (-38, -76, 18),
    ]]
    chamfer(f18_5_edges, length=F18_SIZE)

    # F18#6 (call 6 of 7)
    f18_6_edges = [f1.edges().sort_by_distance(p)[0] for p in [
        (-14, 76, 18),
    ]]
    chamfer(f18_6_edges, length=F18_SIZE)

    # F18#7 (call 7 of 7)
    f18_7_edges = [f1.edges().sort_by_distance(p)[0] for p in [
        (14, 76, 18),
    ]]
    chamfer(f18_7_edges, length=F18_SIZE)

    # F19 (on face) → F20 (cut)
    with BuildSketch(Plane.XY.offset(3)):
        with Locations((10, 63)):
            Circle(F19_R)
        with Locations((-10, 63)):
            Circle(F19_R)
        with Locations((10, -63)):
            Circle(F19_R)
        with Locations((-10, -63)):
            Circle(F19_R)
    extrude(amount=-F20_DEPTH, mode=Mode.SUBTRACT)


solid = f1.part
